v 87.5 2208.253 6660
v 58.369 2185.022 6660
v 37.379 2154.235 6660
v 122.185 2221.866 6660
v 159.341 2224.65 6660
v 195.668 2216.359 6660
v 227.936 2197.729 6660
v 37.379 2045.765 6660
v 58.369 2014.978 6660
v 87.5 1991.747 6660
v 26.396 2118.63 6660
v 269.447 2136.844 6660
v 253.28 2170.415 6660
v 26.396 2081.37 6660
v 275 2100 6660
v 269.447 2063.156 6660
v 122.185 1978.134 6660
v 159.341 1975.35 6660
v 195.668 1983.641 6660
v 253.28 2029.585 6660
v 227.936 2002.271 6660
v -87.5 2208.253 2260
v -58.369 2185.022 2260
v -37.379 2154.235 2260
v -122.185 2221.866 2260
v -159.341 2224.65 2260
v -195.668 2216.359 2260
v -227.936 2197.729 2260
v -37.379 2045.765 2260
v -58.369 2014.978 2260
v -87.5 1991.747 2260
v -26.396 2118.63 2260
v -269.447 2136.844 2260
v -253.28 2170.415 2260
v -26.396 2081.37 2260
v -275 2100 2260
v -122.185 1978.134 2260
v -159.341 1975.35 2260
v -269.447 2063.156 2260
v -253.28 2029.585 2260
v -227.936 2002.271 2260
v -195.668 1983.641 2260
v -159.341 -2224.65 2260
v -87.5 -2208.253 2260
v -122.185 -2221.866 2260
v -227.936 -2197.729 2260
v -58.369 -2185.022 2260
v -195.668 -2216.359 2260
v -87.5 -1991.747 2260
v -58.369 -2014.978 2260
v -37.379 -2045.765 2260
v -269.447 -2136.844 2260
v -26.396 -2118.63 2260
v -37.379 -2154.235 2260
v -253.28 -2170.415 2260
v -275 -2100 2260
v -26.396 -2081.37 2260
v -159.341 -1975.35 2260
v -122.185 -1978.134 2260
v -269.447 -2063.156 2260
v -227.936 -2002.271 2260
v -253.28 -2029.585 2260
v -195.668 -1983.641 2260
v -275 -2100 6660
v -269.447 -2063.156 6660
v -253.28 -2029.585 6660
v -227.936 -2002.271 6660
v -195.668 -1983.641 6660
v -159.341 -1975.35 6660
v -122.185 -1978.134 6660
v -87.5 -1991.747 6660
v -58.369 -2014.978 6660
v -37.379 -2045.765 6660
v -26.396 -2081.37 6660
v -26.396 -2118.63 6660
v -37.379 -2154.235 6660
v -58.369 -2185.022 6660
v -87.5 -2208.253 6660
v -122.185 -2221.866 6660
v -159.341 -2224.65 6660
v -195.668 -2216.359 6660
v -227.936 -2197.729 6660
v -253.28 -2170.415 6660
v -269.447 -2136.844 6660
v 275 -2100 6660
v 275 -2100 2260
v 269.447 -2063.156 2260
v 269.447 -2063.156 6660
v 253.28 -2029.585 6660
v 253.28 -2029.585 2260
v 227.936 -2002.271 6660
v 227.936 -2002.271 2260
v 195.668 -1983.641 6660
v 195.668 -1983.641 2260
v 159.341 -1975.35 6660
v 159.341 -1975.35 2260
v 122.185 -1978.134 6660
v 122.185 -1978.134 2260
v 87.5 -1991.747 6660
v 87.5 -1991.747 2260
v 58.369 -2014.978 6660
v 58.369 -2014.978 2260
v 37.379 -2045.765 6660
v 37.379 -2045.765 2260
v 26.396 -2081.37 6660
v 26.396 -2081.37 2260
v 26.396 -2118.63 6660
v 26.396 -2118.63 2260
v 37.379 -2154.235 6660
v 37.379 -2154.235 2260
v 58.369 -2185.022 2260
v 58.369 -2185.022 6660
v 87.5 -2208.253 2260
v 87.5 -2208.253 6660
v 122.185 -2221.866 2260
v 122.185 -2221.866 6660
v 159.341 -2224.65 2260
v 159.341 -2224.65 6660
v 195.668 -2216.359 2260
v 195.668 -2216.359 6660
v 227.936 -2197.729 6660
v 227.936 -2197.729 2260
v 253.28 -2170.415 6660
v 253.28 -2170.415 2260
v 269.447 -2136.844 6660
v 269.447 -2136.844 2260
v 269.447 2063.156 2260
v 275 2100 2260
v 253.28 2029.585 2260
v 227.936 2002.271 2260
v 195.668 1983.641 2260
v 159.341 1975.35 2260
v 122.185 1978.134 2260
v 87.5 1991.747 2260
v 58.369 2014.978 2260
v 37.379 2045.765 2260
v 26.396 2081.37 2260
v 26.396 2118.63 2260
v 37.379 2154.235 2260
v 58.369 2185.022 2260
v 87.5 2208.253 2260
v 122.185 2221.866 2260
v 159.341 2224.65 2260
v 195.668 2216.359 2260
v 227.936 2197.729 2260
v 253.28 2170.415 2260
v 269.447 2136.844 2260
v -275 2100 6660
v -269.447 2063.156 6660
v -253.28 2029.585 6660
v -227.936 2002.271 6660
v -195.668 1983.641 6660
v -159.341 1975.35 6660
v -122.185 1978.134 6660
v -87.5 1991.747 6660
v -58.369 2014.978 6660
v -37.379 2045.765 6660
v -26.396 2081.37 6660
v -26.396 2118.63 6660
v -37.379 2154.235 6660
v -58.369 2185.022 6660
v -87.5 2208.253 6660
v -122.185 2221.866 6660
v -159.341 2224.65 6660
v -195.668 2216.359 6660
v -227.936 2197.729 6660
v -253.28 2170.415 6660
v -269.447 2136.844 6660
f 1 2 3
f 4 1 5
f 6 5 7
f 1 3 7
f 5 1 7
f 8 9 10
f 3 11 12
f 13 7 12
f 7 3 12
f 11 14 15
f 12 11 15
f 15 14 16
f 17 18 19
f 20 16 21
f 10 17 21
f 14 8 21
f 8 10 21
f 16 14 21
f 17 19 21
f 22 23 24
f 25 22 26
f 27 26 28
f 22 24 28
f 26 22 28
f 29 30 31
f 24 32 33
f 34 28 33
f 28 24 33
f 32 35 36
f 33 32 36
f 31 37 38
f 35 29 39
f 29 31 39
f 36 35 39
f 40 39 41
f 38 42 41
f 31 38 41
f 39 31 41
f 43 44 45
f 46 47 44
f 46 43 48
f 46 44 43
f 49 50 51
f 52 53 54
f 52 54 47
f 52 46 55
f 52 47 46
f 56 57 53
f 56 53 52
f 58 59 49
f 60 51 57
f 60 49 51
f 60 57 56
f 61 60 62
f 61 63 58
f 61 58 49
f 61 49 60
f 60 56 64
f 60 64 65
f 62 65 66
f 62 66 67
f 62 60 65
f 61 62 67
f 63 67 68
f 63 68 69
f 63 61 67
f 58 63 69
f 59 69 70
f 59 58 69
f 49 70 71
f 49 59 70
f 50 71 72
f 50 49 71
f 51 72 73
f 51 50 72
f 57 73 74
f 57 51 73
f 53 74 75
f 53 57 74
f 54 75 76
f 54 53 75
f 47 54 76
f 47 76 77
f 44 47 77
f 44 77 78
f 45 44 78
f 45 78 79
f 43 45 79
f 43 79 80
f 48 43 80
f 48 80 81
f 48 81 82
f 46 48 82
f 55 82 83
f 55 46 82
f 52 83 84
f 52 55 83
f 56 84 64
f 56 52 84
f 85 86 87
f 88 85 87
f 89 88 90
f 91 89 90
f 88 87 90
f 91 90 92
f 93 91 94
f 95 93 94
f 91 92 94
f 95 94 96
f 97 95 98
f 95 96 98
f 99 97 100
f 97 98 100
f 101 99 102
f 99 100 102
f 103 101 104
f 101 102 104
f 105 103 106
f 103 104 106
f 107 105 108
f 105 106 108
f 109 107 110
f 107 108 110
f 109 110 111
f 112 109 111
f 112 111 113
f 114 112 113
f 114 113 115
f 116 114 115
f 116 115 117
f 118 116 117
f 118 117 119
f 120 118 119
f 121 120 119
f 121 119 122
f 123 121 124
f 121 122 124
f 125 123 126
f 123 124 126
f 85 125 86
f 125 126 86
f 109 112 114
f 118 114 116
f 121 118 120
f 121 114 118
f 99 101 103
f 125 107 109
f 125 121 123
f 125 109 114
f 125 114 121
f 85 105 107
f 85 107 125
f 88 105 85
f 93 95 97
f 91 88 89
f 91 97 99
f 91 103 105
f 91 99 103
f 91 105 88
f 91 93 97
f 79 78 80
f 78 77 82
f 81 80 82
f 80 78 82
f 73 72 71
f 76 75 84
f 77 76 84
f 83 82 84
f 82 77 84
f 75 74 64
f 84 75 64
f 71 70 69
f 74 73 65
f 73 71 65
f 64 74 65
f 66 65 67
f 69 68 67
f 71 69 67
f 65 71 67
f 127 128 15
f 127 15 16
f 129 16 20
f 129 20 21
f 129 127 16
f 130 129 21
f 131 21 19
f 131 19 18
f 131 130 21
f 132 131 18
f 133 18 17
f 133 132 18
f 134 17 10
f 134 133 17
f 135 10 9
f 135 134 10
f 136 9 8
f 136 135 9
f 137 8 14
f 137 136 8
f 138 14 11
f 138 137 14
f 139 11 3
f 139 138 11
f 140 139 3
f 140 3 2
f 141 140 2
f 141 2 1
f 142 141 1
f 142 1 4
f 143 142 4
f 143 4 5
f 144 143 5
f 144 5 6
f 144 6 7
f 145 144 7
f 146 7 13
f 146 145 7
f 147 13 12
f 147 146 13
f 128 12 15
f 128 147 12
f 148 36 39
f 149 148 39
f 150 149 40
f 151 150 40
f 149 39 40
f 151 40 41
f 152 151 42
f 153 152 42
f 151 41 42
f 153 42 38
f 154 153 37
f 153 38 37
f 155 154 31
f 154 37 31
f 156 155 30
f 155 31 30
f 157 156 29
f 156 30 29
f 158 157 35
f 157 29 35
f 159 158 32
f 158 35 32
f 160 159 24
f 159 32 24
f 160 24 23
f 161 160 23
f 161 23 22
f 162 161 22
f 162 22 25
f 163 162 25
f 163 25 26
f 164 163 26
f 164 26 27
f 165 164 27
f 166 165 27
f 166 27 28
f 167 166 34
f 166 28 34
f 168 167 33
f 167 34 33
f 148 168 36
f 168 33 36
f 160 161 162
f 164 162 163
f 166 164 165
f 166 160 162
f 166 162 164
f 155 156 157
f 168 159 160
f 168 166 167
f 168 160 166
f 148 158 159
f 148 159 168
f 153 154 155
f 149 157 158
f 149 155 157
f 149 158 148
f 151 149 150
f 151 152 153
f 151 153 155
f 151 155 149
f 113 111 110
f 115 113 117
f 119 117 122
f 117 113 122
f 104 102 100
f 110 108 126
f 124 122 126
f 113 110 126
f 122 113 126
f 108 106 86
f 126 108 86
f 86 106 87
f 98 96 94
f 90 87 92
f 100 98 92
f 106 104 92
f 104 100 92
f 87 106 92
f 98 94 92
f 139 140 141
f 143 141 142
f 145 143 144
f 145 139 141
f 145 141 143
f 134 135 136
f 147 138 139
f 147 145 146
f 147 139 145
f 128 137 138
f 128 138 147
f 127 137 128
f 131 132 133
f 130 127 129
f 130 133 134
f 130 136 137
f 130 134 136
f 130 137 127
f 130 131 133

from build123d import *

# Parameters (mm, degrees)
F1_R     = 125
F2_DEPTH = 4400


with BuildPart() as f2:
    # F1 (on offset) → F2 (new body)
    with BuildSketch(Plane.XY.offset(2260)):
        with Locations((150, -2100)):
            Circle(F1_R)
    extrude(amount=F2_DEPTH)


with BuildPart() as f3_1:
    # F3: instance of F2
    add(f2.part.mirror(Plane.YZ))


with BuildPart() as f4_1:
    # F4: instance of F2
    add(f2.part.mirror(Plane.XZ))


with BuildPart() as f4_2:
    # F4: instance of F3_1
    add(f3_1.part.mirror(Plane.XZ))


solid = Compound([f2.part, f3_1.part, f4_1.part, f4_2.part])
